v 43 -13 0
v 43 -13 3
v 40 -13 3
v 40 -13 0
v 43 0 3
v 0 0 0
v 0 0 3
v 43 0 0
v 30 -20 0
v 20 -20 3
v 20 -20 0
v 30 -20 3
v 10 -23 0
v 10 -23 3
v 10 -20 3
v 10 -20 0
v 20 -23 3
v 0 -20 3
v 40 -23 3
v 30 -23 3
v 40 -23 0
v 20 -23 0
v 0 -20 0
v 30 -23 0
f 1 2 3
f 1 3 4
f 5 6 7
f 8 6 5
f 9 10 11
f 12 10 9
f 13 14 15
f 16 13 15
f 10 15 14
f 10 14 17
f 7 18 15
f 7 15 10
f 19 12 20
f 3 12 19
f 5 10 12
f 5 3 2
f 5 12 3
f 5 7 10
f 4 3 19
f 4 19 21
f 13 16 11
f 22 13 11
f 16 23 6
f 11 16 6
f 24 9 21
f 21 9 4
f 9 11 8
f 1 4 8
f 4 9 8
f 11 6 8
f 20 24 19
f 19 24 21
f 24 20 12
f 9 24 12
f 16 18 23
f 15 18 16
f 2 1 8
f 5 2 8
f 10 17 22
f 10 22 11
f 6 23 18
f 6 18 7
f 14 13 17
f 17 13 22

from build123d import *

# Parameters (mm, degrees)
ESQUISSE1_W                = 43
ESQUISSE1_H                = 23
BOSS_EXTRU_1_DEPTH         = 3
ESQUISSE2_W                = 3
ESQUISSE2_H                = 10
ENL_V_MAT_EXTRU_1_DEPTH    = 3
ESQUISSE3_W                = 10
ESQUISSE3_H                = 3
ENL_V_MAT_EXTRU_2_DEPTH    = 3
R_P_TITION_LIN_AIRE1_COUNT = 2
R_P_TITION_LIN_AIRE1_PITCH = 20


with BuildPart() as part:
    # Esquisse1 → Boss.-Extru.1 (new body)
    with BuildSketch(Plane.XY):
        with Locations((21.5, -11.5)):
            Rectangle(ESQUISSE1_W, ESQUISSE1_H)
    extrude(amount=BOSS_EXTRU_1_DEPTH)

    # Esquisse2 → Enlèv. mat.-Extru.1 (cut)
    with BuildSketch(Plane(origin=(43, 0, 0), x_dir=(0, 0, -1), z_dir=(1, 0, 0))):
        with Locations((-1.5, -18)):
            Rectangle(ESQUISSE2_W, ESQUISSE2_H)
    extrude(amount=-ENL_V_MAT_EXTRU_1_DEPTH, mode=Mode.SUBTRACT)

    # Esquisse3 → Enlèv. mat.-Extru.2 (cut)
    with BuildSketch(Plane.XY.offset(3)):
        with Locations((5, -21.5)):
            Rectangle(ESQUISSE3_W, ESQUISSE3_H)
    enl_v_mat_extru_2 = extrude(amount=-ENL_V_MAT_EXTRU_2_DEPTH, mode=Mode.SUBTRACT)

    # Répétition linéaire1: Enlèv. mat.-Extru.2 ×2
    with Locations(*[(i * R_P_TITION_LIN_AIRE1_PITCH, 0, 0) for i in range(1, R_P_TITION_LIN_AIRE1_COUNT)]):
        add(enl_v_mat_extru_2, mode=Mode.SUBTRACT)


solid = part.part
